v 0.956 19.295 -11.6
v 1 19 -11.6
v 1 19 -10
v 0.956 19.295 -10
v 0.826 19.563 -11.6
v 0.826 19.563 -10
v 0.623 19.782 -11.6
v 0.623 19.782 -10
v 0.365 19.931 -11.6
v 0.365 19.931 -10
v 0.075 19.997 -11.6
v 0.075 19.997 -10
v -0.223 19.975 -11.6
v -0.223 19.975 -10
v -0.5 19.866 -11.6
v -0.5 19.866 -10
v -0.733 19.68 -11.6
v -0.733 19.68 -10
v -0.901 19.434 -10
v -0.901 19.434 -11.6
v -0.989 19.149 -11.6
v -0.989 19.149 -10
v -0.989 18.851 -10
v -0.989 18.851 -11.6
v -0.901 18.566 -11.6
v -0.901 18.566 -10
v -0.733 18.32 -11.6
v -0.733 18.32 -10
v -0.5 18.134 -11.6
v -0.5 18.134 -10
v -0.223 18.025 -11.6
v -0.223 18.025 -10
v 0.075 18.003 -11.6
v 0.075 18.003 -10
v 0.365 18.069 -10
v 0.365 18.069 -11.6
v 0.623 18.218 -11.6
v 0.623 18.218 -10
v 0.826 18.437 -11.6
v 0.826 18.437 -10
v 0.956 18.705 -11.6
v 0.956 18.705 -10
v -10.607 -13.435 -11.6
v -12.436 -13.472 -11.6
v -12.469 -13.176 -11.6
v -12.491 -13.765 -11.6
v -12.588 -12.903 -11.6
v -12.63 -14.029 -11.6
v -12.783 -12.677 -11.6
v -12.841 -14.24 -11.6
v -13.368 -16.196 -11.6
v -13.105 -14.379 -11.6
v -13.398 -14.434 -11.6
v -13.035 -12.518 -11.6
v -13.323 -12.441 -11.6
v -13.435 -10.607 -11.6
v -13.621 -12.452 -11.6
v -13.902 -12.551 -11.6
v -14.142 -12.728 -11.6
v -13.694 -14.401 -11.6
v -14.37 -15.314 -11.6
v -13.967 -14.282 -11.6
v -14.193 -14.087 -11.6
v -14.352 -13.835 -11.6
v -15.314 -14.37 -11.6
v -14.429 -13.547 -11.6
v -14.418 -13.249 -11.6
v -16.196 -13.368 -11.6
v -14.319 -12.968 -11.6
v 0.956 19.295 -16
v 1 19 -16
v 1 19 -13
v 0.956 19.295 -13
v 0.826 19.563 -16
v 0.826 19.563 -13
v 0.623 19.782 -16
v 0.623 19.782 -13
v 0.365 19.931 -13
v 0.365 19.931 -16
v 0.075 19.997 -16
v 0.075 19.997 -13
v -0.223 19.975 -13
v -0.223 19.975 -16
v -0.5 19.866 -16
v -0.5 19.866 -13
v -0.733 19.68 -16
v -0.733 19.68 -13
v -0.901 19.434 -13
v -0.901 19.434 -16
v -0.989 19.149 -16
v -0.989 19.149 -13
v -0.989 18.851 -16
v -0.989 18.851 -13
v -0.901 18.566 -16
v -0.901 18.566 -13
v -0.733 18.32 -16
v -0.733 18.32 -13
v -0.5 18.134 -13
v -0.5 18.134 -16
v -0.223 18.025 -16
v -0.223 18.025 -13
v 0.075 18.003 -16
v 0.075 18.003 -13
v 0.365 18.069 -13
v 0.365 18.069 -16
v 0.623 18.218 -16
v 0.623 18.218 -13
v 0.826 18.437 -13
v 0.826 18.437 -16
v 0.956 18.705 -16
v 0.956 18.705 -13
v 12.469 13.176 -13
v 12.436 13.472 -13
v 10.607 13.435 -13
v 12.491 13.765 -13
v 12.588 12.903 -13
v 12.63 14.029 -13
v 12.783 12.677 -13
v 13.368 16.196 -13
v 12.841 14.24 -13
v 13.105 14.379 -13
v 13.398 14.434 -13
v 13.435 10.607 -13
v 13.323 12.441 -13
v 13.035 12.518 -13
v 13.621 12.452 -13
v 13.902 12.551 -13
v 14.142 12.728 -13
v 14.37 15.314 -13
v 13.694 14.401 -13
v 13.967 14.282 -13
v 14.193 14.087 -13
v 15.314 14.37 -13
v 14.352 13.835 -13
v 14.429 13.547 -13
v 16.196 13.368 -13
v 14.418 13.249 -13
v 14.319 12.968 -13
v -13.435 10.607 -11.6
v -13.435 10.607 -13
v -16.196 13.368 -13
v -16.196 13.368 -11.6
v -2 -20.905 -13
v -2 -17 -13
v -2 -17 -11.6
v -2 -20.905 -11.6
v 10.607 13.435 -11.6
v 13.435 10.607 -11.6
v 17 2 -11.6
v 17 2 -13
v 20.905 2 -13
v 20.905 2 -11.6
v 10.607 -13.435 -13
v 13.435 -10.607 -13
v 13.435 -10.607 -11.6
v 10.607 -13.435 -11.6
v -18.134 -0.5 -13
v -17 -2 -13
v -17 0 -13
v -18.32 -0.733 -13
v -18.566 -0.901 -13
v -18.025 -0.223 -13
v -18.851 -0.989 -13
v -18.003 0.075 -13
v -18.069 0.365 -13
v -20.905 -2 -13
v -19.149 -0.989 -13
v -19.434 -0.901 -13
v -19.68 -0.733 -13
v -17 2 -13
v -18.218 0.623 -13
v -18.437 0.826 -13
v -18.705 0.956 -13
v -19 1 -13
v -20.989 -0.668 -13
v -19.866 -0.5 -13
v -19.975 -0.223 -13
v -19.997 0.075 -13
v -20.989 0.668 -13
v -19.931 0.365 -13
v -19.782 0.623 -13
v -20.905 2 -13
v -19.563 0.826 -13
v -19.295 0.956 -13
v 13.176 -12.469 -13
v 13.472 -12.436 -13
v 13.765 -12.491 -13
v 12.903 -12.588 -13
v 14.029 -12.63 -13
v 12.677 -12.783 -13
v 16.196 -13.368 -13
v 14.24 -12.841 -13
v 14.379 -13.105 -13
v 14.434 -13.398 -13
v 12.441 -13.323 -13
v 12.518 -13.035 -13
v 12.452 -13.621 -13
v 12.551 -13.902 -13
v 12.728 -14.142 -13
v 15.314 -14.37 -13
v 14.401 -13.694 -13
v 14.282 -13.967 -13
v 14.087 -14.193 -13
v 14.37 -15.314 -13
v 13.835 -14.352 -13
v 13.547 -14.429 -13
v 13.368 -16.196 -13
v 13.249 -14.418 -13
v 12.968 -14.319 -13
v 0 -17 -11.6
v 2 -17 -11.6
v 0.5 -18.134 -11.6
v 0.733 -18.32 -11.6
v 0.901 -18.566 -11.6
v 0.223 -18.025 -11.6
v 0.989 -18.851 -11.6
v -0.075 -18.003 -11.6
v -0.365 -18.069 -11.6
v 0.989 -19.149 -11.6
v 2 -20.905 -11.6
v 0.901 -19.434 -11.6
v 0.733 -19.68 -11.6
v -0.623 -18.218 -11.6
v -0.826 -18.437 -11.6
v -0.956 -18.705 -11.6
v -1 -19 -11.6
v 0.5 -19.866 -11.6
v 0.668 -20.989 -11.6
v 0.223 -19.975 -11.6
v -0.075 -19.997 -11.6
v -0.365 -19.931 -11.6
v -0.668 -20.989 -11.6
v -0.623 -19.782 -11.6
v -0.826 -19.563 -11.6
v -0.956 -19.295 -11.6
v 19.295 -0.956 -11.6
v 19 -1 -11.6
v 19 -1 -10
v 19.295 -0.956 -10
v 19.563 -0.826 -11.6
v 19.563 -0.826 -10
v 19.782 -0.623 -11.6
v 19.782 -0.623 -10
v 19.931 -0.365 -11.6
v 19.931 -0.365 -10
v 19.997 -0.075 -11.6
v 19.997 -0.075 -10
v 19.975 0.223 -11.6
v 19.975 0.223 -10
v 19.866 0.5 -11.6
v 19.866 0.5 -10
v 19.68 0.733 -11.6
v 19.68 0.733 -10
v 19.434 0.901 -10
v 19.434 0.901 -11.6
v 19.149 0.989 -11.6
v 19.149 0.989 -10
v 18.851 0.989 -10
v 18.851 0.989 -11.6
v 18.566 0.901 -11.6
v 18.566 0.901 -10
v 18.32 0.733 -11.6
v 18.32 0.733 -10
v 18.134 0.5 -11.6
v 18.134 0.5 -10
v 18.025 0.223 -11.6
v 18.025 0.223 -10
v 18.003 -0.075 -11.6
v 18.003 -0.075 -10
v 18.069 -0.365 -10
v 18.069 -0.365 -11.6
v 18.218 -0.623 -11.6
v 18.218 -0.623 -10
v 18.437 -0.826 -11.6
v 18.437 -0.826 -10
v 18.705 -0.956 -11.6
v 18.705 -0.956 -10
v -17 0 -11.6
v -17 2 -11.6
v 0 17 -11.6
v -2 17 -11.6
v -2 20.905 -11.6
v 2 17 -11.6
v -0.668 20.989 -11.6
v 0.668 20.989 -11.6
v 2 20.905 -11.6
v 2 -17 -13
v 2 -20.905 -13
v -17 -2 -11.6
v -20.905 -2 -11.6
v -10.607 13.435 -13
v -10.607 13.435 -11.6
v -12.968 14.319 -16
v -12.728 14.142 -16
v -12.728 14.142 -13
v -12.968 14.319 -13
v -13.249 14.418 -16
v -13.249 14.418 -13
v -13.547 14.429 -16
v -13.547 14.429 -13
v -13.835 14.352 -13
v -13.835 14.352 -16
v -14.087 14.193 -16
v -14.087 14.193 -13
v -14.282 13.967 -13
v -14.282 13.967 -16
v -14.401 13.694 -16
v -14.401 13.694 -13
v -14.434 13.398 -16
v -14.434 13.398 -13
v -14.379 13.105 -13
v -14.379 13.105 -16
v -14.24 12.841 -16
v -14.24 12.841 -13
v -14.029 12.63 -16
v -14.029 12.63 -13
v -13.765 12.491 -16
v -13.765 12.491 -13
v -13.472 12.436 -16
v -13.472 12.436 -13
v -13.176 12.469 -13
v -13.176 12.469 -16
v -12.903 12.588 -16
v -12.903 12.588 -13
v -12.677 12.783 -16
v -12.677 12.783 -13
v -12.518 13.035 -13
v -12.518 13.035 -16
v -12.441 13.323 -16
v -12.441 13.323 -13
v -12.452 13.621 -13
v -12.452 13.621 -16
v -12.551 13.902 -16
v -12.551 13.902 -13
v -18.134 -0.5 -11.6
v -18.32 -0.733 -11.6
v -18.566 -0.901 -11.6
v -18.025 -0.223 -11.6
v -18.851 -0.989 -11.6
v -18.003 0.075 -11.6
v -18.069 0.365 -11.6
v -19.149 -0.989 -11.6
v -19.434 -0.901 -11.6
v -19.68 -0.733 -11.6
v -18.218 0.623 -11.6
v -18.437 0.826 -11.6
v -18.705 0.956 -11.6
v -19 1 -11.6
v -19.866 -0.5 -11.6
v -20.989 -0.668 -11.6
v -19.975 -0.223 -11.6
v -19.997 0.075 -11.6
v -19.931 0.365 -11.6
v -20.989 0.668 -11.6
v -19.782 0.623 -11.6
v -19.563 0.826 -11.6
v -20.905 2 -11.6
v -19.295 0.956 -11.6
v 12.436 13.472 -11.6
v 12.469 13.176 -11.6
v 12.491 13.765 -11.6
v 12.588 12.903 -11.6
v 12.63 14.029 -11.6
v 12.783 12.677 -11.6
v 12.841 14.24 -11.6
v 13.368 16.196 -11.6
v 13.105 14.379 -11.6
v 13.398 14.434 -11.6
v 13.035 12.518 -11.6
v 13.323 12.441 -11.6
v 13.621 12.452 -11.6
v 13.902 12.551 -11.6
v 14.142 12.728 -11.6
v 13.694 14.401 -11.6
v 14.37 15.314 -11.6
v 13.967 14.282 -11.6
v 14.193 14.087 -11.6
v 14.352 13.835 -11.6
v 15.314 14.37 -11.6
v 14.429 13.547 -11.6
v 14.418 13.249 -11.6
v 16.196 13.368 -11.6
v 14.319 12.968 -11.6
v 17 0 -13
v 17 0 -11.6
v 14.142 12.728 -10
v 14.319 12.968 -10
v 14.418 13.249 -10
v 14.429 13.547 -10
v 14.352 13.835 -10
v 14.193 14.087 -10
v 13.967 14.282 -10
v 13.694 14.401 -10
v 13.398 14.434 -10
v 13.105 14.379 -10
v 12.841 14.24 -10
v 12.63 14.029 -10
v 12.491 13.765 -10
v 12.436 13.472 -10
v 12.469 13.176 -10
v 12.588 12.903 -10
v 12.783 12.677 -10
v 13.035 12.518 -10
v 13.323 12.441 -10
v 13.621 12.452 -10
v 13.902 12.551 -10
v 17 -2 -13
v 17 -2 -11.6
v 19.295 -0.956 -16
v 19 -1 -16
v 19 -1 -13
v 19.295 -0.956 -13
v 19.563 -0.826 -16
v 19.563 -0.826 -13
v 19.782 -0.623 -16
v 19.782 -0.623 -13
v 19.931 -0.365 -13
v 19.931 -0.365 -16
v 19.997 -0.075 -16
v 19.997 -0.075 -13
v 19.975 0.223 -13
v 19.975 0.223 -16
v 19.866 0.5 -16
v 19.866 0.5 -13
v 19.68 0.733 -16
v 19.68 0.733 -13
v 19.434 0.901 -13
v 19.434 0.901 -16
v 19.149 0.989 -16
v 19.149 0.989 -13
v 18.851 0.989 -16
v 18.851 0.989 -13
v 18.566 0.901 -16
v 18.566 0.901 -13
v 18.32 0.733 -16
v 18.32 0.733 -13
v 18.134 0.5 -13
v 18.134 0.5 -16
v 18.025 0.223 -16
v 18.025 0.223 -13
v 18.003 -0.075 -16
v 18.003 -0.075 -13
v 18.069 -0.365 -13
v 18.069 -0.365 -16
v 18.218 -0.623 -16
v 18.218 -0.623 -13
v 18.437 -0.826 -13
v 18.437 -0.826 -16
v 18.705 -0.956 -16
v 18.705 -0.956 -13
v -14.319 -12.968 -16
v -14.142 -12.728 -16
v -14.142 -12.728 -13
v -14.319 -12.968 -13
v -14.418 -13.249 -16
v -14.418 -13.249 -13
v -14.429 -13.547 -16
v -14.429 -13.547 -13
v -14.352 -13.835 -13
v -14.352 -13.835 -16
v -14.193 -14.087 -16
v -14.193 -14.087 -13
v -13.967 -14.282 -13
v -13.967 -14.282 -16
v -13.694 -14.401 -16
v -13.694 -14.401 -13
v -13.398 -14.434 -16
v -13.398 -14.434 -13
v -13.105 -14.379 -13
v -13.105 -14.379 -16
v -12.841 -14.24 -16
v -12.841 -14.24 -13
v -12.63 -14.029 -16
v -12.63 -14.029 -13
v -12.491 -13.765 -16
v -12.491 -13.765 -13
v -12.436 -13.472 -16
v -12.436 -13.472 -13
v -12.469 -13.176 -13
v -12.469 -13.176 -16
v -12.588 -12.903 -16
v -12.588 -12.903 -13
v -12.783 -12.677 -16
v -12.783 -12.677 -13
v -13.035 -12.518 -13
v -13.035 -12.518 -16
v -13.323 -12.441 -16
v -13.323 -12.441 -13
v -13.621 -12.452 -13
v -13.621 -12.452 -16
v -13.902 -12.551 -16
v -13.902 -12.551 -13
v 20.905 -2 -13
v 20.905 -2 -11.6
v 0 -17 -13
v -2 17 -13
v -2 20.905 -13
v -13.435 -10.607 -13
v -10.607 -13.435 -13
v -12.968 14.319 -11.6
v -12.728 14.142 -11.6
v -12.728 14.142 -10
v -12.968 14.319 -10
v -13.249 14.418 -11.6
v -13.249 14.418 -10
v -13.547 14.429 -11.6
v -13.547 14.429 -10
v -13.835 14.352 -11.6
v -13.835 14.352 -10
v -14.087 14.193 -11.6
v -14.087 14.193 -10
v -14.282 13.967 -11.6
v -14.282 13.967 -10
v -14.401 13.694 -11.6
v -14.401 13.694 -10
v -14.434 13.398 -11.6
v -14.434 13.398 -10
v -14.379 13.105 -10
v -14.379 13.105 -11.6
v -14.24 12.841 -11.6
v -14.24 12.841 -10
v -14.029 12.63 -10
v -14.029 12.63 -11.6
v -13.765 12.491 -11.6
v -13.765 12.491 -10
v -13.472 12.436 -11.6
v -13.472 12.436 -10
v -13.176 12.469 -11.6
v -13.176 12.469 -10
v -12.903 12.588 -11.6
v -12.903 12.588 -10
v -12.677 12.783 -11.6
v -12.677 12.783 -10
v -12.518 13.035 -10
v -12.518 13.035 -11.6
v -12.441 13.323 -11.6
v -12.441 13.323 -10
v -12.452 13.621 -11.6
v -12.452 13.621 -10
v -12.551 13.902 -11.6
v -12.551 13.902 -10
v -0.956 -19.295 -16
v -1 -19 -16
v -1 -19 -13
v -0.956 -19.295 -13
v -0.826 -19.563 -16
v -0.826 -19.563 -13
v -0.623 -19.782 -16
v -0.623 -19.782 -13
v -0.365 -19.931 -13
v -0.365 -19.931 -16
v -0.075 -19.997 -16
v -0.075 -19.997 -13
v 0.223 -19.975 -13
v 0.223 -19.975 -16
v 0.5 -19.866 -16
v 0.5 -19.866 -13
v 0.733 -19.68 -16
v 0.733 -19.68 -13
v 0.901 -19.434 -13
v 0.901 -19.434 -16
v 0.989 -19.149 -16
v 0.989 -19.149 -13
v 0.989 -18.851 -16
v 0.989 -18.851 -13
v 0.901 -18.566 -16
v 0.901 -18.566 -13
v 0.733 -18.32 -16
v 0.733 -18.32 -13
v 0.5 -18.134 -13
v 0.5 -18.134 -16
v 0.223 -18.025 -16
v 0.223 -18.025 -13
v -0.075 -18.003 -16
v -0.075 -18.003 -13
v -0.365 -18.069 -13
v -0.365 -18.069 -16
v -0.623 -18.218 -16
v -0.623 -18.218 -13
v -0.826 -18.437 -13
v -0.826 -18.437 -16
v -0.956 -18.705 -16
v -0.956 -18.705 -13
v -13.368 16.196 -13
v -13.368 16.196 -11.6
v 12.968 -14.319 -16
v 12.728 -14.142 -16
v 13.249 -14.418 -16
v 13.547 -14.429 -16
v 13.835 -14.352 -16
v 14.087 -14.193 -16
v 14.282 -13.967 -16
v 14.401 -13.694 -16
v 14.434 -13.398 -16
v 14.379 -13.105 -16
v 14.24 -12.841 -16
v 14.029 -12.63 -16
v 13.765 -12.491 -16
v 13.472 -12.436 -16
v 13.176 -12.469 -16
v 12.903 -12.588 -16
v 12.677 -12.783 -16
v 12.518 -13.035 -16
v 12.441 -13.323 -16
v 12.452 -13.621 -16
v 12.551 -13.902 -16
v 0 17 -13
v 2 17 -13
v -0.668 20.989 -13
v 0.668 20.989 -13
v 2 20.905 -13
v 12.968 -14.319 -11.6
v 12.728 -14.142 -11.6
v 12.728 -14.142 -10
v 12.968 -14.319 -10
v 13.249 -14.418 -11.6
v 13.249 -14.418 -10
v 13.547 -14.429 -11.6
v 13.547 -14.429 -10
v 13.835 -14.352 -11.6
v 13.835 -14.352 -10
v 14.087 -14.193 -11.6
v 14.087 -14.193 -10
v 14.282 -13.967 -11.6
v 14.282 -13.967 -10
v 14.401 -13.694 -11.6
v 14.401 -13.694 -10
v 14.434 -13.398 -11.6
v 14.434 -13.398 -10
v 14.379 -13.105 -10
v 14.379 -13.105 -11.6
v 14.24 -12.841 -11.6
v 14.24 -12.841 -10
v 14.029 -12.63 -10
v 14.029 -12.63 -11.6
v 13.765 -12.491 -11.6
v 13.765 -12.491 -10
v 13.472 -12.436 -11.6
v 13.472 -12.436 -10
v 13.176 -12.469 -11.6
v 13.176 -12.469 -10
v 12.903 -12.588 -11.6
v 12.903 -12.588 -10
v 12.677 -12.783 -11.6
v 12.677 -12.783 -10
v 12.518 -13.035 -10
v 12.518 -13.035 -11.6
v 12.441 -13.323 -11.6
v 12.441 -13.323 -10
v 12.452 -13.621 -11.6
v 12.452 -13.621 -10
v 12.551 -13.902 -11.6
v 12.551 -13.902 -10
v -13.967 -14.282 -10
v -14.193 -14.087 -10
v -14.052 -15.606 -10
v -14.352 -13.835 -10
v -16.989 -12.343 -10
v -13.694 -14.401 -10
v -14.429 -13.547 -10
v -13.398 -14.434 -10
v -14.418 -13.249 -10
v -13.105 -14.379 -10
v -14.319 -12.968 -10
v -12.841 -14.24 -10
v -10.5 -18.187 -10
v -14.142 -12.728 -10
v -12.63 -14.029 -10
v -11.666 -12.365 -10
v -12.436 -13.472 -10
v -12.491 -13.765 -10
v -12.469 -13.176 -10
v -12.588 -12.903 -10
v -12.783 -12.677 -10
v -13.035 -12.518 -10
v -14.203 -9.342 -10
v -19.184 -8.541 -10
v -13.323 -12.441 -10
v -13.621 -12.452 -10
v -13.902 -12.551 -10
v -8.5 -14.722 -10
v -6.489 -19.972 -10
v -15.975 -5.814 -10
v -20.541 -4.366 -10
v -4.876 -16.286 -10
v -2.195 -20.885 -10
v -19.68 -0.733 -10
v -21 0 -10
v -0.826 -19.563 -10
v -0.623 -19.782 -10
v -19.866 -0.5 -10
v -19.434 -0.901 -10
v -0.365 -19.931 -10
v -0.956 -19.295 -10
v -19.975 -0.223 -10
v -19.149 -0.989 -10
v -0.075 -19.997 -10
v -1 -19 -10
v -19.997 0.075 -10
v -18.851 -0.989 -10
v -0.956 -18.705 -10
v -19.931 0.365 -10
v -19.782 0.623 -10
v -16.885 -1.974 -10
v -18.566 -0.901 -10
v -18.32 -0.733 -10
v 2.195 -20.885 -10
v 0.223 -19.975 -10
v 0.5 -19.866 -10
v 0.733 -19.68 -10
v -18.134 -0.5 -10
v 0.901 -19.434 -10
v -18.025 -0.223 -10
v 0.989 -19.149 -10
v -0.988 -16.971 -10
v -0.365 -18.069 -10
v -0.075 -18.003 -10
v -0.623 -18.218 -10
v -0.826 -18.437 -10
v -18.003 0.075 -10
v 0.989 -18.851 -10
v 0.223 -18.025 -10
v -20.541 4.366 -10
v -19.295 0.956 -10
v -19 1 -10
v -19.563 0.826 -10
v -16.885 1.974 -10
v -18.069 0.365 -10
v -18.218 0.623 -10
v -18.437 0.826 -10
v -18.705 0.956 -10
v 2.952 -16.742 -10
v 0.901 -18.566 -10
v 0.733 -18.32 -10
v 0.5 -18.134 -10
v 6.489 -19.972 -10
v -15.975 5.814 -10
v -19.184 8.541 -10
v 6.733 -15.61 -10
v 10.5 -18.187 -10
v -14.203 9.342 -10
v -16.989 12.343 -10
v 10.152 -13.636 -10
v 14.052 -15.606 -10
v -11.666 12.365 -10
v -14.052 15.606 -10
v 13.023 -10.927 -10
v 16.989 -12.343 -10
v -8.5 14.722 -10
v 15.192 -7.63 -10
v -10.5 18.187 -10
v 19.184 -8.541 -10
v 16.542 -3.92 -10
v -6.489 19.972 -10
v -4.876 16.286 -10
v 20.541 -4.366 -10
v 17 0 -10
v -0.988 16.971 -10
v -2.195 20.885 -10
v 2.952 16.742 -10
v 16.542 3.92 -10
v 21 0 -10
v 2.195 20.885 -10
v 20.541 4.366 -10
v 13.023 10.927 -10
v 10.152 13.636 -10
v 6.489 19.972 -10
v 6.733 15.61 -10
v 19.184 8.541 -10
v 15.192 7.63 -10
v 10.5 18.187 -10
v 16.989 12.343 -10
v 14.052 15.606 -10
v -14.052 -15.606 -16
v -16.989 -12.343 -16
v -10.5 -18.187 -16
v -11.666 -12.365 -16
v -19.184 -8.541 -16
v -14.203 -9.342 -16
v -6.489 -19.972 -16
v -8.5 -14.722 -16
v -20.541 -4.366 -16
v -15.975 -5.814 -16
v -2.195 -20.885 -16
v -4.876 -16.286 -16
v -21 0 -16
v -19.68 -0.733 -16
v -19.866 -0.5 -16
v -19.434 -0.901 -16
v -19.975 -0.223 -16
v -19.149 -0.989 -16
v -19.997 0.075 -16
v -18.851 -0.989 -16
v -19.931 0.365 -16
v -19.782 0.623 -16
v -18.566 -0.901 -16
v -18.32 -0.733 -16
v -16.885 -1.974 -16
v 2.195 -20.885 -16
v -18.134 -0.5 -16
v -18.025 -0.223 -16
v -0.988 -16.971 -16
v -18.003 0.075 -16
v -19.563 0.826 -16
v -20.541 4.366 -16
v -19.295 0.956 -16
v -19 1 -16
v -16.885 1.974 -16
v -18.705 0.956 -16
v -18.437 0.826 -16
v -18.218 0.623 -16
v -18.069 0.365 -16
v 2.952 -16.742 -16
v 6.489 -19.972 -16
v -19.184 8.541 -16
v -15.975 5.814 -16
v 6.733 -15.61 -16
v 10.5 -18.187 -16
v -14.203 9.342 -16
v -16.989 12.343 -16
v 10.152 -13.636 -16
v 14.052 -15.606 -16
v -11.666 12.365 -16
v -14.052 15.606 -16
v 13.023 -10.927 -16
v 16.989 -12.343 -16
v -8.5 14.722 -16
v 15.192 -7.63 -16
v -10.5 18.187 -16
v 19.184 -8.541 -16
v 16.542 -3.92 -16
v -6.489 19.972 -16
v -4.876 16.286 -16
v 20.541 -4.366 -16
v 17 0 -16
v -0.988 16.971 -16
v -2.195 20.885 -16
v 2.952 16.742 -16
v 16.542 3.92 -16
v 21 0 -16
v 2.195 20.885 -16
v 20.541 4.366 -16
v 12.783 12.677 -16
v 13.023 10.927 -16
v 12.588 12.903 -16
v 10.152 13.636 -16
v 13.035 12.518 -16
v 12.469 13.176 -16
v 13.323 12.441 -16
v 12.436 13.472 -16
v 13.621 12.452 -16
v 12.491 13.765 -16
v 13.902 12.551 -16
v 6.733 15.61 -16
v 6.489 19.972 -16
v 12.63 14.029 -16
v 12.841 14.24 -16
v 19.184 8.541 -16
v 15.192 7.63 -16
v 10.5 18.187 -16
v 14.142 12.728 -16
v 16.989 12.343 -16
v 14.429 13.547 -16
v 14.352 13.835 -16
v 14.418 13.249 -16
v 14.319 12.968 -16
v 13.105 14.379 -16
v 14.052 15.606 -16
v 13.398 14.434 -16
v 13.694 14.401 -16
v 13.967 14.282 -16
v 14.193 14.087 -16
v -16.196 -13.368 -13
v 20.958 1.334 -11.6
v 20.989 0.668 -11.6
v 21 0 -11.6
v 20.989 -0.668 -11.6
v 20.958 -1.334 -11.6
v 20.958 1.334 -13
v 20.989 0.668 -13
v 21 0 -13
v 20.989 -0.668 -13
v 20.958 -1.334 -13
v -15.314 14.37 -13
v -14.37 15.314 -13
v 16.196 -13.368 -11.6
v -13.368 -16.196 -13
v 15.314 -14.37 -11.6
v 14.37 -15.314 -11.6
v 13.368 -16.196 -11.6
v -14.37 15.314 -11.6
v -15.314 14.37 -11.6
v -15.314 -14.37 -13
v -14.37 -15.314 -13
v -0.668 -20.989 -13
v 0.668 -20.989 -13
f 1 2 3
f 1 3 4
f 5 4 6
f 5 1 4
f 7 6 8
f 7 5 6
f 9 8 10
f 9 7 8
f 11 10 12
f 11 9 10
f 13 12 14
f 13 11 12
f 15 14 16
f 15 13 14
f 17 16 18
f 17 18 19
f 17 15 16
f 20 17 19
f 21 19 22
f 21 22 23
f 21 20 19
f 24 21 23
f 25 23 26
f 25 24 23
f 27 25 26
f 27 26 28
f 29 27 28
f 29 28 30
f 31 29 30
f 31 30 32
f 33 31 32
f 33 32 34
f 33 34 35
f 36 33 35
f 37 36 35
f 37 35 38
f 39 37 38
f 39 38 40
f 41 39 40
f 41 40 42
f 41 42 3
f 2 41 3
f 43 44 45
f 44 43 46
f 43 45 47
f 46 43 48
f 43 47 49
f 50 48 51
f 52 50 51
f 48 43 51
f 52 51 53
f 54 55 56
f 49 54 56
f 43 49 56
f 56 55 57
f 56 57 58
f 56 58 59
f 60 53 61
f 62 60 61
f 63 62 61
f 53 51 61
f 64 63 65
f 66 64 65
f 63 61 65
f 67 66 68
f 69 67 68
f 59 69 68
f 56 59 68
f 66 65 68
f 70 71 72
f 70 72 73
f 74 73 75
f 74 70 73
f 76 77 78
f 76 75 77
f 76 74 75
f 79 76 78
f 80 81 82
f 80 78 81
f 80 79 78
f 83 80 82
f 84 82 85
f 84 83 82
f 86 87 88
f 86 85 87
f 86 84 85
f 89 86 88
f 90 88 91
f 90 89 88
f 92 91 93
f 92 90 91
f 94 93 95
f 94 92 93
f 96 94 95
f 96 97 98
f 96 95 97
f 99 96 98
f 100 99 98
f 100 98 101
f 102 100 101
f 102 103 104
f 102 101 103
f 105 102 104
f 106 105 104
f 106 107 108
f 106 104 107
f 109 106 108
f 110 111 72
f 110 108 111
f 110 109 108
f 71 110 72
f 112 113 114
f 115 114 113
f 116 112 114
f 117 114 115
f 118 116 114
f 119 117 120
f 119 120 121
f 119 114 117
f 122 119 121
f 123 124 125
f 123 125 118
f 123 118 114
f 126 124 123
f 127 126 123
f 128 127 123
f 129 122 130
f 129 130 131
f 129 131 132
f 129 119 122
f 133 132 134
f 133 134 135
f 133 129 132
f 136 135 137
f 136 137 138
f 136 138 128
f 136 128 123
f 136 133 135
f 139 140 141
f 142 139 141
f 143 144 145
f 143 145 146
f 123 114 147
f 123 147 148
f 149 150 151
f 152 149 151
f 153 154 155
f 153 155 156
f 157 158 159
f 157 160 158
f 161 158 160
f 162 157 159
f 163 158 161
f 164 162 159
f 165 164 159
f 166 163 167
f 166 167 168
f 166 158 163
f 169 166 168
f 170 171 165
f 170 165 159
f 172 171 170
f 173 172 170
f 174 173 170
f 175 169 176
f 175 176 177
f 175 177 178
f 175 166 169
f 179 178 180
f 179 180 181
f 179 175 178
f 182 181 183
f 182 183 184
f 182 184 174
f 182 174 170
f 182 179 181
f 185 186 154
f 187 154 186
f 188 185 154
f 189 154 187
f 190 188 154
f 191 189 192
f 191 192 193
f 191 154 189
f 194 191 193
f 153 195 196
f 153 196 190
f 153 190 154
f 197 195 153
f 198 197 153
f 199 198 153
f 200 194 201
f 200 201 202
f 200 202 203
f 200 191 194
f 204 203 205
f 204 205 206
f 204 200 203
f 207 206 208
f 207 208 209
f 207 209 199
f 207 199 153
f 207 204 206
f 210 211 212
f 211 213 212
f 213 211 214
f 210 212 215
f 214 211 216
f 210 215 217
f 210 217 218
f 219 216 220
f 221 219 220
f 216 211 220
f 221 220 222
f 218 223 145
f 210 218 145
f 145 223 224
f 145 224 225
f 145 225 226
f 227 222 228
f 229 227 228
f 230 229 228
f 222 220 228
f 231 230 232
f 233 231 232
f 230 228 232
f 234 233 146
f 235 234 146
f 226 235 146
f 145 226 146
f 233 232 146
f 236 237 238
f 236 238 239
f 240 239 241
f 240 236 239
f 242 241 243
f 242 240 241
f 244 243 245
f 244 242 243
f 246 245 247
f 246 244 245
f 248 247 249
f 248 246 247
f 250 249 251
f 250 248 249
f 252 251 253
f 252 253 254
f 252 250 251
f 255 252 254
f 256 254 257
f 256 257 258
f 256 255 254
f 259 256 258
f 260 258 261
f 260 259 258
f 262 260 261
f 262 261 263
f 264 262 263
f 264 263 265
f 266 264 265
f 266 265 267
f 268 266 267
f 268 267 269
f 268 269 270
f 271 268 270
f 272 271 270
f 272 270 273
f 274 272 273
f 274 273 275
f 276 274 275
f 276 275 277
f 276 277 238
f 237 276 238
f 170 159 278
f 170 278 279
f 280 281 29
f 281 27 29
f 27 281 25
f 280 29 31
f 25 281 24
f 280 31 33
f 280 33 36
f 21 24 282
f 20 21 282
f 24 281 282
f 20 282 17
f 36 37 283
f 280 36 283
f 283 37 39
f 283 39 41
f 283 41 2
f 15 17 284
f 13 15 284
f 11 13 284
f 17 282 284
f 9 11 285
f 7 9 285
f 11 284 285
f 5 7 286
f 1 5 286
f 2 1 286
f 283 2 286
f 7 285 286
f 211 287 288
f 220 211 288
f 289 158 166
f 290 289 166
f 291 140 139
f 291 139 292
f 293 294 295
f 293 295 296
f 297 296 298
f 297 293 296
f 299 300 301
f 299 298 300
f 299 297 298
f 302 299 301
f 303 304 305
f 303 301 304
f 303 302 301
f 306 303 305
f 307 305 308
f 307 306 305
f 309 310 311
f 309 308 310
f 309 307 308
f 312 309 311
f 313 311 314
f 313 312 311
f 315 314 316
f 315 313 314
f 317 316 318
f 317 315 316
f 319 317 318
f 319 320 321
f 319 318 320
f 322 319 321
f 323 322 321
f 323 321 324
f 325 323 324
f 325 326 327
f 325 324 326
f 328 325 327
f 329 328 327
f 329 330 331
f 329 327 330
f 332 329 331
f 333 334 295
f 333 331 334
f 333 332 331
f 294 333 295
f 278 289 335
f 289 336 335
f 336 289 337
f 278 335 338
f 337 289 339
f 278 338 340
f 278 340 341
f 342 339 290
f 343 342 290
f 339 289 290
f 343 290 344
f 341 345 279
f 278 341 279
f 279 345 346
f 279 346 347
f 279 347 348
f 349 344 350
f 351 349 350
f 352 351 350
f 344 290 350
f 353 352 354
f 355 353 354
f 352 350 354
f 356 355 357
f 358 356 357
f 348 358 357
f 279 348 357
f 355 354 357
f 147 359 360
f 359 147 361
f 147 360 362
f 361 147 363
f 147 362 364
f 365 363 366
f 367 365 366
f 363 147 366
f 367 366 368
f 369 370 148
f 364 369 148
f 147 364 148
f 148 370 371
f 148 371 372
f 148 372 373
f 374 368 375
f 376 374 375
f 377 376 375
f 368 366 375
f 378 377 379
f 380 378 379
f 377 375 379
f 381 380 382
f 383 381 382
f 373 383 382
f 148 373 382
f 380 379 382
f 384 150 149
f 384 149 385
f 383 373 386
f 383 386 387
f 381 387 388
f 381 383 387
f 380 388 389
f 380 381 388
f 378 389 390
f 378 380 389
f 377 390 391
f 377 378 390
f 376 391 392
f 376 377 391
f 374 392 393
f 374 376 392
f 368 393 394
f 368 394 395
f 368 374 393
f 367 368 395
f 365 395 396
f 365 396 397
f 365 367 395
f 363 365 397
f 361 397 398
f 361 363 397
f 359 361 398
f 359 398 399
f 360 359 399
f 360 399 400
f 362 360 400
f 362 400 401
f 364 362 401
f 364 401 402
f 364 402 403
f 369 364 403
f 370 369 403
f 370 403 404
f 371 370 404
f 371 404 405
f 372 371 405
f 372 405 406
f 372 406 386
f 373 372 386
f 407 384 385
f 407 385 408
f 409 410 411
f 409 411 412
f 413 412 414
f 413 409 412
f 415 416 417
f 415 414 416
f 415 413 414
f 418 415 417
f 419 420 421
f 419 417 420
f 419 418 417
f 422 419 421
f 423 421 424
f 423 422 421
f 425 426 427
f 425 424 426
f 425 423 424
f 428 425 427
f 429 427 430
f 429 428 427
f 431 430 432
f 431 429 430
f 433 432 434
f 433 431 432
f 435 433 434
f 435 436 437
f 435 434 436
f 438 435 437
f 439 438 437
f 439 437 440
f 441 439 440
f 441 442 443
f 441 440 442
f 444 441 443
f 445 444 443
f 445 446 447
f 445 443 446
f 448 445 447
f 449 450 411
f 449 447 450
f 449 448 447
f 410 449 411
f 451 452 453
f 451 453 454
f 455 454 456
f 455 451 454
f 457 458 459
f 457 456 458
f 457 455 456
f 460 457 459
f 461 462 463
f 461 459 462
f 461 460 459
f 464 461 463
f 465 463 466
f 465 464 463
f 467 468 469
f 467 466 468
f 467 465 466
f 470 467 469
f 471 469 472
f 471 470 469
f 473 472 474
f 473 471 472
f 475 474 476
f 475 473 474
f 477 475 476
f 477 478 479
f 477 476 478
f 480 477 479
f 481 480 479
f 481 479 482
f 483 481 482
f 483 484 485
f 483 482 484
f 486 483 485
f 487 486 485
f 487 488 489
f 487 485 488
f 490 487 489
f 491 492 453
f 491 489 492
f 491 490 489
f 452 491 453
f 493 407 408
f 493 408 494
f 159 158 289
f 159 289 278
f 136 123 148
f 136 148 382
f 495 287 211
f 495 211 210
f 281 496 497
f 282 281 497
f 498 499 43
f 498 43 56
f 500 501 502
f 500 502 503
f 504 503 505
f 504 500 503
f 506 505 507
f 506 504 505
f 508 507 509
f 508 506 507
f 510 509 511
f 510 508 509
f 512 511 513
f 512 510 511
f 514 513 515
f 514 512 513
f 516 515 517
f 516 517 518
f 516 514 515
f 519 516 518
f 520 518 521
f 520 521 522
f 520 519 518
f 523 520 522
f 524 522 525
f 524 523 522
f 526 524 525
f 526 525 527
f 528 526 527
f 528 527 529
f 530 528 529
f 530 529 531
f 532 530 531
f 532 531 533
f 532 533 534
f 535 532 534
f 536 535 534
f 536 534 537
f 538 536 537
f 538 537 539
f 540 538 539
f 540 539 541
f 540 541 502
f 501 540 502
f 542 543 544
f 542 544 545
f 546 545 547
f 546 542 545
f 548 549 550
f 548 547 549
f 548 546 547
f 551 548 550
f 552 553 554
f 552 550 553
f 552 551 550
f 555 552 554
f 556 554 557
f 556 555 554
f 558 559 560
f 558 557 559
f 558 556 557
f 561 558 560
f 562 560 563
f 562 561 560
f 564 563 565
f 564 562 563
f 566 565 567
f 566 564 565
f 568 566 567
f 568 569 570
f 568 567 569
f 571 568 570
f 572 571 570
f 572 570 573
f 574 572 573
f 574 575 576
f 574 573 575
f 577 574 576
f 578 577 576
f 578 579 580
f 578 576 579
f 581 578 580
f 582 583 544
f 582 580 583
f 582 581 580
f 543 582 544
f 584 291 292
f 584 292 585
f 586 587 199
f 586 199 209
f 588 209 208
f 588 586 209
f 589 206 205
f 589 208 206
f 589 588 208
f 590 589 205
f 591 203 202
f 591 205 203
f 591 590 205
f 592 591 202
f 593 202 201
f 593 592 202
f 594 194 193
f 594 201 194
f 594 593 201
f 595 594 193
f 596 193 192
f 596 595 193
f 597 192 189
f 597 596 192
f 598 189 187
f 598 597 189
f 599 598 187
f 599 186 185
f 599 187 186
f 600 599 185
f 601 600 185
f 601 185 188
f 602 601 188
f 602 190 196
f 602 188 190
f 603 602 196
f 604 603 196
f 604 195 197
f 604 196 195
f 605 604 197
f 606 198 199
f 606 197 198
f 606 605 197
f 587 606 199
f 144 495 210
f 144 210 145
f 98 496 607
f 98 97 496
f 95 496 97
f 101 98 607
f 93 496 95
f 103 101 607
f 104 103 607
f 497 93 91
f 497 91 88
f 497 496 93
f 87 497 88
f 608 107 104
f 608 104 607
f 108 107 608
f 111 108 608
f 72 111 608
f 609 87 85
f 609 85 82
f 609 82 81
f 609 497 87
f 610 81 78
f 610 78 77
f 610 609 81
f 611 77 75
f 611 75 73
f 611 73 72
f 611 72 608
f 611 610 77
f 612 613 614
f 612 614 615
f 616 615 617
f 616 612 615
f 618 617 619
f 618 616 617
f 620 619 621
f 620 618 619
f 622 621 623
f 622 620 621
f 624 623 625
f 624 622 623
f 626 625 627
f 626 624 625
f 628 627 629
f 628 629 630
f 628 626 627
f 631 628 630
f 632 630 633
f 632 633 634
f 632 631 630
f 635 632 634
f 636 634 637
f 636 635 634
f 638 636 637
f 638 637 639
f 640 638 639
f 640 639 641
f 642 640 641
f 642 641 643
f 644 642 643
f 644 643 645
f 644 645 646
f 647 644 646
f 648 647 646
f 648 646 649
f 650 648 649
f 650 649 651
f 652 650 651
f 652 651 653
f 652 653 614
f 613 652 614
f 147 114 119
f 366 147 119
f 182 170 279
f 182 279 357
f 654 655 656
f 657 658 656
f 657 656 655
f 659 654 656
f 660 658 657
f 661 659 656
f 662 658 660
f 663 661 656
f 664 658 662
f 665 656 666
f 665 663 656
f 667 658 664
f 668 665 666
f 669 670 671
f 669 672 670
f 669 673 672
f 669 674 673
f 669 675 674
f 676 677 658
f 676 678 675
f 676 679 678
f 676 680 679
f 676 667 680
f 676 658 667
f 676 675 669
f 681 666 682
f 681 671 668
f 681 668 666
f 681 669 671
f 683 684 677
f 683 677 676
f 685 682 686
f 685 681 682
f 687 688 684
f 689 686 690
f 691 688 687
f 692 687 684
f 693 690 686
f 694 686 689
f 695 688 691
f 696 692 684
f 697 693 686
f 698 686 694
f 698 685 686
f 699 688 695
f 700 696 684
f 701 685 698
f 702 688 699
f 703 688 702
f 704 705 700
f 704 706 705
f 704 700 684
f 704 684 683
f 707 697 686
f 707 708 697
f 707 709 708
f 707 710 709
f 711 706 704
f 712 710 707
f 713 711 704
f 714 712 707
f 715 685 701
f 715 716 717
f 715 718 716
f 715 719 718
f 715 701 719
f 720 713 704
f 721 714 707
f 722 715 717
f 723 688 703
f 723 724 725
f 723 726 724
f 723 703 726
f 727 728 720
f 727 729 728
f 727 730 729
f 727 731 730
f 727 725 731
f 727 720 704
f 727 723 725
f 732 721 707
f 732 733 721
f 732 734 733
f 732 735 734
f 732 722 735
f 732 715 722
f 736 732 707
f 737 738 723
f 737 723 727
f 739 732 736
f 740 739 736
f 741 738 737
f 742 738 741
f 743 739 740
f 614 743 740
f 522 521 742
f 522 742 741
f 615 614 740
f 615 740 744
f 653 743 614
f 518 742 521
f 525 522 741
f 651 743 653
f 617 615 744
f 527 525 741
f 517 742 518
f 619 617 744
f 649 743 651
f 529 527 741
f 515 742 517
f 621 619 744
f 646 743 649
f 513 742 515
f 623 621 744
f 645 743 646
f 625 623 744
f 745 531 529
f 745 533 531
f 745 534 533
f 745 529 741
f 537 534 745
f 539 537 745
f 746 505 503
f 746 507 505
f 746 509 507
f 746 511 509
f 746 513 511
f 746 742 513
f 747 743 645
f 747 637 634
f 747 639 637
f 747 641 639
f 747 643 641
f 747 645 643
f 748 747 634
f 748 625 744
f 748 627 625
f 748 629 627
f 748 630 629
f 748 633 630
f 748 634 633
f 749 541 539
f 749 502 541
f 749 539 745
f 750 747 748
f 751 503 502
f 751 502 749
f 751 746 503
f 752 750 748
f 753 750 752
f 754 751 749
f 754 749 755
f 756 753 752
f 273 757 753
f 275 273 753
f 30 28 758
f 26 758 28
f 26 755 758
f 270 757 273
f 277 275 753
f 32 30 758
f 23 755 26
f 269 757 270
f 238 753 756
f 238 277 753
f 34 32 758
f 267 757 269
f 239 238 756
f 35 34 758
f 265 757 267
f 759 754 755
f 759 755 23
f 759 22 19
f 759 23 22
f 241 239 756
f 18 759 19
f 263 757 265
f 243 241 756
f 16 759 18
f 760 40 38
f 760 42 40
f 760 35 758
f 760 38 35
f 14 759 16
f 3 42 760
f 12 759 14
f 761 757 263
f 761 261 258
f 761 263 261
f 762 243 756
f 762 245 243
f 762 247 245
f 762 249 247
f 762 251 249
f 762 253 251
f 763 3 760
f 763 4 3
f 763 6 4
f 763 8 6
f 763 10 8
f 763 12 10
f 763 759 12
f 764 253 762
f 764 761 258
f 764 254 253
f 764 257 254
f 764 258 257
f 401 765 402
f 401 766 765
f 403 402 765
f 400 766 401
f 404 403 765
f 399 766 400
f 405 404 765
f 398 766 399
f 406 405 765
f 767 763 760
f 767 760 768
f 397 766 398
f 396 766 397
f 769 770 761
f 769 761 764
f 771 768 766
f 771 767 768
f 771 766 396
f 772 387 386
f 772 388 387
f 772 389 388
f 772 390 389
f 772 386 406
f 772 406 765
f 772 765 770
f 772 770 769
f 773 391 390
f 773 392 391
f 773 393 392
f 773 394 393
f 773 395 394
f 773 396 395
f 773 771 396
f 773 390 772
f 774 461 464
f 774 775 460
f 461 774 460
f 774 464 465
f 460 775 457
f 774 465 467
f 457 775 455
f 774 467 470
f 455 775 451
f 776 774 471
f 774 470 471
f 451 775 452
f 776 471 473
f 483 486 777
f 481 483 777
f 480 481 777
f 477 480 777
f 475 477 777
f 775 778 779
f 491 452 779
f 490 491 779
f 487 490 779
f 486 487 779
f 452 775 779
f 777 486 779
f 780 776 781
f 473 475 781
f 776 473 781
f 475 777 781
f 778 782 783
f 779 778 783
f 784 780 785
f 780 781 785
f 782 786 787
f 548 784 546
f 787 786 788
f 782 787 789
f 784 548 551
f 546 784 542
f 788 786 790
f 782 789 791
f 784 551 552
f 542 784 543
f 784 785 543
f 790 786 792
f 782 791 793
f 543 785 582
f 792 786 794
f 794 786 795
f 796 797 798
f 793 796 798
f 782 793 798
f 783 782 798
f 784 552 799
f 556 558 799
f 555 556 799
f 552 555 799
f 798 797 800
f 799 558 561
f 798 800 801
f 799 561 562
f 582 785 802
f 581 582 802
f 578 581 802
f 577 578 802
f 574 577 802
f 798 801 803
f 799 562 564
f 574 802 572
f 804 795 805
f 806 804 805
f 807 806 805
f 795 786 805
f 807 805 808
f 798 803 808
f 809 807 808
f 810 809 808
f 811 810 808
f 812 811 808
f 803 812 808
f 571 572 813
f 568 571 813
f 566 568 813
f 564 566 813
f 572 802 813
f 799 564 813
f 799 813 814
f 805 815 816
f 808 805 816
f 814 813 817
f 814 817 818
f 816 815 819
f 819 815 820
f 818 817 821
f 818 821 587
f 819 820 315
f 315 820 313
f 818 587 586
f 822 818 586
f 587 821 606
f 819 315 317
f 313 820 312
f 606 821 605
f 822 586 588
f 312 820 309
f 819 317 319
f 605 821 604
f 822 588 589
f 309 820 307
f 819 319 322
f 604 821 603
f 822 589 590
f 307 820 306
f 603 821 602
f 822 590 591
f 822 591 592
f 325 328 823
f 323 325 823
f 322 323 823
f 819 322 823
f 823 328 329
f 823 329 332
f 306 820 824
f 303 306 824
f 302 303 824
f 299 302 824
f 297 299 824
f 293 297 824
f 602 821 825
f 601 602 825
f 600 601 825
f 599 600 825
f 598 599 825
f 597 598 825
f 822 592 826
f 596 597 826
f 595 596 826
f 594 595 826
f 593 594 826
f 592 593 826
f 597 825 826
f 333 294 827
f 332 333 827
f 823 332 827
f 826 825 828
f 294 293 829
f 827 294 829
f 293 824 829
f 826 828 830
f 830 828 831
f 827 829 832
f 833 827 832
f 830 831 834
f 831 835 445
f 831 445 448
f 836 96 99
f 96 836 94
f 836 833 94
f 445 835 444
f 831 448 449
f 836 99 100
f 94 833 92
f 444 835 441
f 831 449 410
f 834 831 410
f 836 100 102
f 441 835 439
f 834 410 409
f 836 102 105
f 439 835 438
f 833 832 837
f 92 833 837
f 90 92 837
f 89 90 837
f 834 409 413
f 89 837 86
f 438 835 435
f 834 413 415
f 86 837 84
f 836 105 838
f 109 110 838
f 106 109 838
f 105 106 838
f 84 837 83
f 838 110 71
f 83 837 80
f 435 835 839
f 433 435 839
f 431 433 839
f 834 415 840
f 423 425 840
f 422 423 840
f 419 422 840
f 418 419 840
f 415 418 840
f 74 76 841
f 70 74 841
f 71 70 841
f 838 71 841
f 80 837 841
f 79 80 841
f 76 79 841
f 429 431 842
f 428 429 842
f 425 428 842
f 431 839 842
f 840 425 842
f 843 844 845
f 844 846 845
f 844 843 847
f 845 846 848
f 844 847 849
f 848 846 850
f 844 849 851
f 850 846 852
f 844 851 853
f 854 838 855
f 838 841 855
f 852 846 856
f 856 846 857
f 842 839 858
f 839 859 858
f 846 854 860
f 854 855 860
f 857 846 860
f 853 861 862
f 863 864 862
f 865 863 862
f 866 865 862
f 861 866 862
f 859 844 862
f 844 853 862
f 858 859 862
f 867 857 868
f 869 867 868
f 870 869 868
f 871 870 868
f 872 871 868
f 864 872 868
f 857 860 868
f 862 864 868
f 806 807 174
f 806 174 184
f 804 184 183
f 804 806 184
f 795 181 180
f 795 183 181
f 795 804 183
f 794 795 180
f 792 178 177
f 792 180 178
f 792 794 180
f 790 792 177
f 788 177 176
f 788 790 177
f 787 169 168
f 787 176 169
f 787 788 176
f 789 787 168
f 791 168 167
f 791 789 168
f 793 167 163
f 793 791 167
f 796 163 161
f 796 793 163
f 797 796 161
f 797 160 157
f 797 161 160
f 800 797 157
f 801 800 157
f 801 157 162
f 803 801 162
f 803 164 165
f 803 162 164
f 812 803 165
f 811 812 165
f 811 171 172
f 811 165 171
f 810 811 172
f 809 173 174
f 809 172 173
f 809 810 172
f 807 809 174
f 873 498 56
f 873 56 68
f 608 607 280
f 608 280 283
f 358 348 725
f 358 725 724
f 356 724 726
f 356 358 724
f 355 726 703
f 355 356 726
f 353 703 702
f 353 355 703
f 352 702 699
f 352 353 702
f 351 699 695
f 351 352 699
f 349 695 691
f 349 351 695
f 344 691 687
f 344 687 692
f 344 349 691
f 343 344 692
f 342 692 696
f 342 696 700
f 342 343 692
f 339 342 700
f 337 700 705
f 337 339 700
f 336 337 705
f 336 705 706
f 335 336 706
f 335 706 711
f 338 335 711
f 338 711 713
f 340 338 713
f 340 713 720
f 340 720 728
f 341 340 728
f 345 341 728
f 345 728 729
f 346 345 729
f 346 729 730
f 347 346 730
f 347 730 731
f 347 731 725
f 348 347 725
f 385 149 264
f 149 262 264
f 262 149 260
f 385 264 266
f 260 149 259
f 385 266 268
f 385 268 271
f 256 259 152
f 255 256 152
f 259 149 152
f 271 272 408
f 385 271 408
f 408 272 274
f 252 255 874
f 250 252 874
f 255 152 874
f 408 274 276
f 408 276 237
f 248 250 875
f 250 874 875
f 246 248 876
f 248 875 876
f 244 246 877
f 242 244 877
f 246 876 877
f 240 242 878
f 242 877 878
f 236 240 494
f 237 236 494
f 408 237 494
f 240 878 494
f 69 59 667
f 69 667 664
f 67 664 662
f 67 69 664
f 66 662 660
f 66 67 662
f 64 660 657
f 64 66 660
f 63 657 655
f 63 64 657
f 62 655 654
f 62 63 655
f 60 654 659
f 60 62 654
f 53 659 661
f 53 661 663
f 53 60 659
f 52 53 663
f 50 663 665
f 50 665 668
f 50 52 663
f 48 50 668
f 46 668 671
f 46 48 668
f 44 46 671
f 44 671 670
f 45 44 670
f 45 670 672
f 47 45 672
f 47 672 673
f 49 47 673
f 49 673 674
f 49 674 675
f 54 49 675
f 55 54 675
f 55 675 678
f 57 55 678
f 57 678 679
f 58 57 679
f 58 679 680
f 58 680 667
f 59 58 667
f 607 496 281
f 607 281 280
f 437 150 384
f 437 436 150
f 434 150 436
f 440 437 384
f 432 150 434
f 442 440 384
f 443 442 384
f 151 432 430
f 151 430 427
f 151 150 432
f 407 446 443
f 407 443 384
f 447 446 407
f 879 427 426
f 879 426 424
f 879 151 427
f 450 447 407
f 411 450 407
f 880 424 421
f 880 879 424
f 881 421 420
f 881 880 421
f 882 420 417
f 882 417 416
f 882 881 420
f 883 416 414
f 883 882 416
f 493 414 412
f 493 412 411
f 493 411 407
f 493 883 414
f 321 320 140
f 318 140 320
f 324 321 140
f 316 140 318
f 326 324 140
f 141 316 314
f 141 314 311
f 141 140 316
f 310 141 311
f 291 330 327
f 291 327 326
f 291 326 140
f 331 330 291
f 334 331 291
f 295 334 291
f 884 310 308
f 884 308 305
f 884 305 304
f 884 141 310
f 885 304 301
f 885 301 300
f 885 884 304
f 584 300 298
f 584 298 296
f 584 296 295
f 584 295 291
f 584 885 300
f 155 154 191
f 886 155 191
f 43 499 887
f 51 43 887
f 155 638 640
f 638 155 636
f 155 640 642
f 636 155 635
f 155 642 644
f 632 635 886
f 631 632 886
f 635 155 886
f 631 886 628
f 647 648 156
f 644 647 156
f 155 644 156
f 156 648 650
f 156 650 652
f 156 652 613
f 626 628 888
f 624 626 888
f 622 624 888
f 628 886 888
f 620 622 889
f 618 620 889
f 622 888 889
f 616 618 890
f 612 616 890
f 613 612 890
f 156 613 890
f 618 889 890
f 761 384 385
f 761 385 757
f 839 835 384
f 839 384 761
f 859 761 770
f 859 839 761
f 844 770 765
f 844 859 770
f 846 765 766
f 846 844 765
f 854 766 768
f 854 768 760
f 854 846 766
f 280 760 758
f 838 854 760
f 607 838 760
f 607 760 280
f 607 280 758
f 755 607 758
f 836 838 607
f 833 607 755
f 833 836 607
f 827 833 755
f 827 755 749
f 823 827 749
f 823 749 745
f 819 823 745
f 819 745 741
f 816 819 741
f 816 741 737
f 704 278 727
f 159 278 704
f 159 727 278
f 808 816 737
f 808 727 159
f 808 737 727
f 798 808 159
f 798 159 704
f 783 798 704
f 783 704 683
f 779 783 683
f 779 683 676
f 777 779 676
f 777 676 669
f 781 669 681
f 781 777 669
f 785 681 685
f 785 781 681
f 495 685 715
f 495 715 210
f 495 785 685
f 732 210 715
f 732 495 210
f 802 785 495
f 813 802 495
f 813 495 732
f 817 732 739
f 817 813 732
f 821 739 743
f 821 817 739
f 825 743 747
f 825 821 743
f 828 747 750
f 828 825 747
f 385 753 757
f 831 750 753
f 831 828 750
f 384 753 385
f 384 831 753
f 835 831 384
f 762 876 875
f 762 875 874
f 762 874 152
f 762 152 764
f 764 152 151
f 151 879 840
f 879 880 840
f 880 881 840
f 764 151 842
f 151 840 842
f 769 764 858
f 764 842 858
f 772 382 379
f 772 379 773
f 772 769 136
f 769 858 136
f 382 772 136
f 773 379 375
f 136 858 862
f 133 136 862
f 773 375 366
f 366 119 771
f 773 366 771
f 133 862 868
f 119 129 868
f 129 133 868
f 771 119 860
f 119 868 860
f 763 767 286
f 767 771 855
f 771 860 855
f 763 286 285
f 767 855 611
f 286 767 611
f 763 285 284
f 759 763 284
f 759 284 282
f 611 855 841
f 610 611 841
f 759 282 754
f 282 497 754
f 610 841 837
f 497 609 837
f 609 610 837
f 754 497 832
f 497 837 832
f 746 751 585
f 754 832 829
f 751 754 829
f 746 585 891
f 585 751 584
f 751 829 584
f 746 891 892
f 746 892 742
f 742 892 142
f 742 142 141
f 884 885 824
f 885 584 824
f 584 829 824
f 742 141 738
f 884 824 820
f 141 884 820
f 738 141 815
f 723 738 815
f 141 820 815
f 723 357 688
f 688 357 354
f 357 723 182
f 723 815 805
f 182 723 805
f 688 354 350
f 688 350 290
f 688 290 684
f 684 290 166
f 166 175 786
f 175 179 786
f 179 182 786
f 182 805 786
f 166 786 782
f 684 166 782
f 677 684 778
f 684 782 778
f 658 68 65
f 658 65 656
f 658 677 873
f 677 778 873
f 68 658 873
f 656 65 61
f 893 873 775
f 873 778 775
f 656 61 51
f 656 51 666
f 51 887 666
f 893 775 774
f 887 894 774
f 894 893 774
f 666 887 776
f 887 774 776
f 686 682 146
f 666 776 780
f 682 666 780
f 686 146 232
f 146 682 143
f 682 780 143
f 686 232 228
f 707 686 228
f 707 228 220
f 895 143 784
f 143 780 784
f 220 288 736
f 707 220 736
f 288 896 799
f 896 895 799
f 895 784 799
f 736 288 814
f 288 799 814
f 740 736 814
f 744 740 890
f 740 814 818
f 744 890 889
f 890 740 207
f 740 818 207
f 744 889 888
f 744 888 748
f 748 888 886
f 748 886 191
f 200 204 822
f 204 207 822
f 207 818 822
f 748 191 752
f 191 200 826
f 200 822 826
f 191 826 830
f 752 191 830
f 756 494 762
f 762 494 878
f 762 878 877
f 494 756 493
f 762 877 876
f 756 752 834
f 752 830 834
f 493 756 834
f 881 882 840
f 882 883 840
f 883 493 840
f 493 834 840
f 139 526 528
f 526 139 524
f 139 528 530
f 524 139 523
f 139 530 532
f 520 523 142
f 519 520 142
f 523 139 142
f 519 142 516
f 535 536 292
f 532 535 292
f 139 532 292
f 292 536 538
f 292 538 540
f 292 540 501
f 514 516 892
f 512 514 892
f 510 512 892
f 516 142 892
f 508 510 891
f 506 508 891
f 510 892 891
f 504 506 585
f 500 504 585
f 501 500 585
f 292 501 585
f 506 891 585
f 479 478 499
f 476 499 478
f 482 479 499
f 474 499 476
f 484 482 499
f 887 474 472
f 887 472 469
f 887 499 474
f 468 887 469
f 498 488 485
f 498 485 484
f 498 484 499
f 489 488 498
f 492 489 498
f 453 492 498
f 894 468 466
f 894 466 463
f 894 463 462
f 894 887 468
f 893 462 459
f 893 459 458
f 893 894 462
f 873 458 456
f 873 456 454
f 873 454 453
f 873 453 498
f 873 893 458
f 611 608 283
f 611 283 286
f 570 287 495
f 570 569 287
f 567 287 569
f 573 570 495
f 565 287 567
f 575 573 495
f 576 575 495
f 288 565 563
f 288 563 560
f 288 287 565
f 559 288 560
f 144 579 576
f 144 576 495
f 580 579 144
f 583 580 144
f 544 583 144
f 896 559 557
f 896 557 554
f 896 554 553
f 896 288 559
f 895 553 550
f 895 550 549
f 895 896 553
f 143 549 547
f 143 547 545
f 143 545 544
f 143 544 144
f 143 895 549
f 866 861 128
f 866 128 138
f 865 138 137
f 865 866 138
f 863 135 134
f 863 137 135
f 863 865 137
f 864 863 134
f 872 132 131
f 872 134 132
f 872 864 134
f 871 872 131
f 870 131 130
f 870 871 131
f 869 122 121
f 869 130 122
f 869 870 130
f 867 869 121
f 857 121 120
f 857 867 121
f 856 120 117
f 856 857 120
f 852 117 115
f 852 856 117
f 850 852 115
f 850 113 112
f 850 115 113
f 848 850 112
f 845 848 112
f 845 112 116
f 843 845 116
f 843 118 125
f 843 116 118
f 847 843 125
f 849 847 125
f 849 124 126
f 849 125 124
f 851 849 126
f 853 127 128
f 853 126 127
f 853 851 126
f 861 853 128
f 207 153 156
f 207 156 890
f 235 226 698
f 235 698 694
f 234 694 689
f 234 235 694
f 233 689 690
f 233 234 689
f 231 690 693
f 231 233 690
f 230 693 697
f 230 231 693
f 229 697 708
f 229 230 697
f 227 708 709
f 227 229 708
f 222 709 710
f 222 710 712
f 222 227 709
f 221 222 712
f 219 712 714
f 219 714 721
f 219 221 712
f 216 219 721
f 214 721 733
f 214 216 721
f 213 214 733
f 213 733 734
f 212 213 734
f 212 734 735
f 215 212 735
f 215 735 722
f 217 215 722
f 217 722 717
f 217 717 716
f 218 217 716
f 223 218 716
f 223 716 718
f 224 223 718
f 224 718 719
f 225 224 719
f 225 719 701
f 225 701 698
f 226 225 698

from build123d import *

# Parameters (mm, degrees)
CYLINDER2767_R               = 1
CYLINDER2767_DEPTH           = 10
CYLINDER2767_PLACEMENT_ANGLE = 45
CYLINDER2768_R               = 1
CYLINDER2768_DEPTH           = 10
CYLINDER2769_R               = 1
CYLINDER2769_DEPTH           = 10
CYLINDER2769_PLACEMENT_ANGLE = 135
CYLINDER2770_R               = 1
CYLINDER2770_DEPTH           = 10
CYLINDER2771_R               = 1
CYLINDER2771_DEPTH           = 10
CYLINDER2771_PLACEMENT_ANGLE = 225
CYLINDER2772_R               = 1
CYLINDER2772_DEPTH           = 10
CYLINDER2773_R               = 1
CYLINDER2773_DEPTH           = 10
CYLINDER2773_PLACEMENT_ANGLE = 45
CYLINDER2766_R               = 1
CYLINDER2766_DEPTH           = 10
BOX961_W                     = 4
BOX961_H                     = 4
BOX961_DEPTH                 = 1.4
BOX961_PLACEMENT_ANGLE       = 45
BOX964_W                     = 4
BOX964_H                     = 4
BOX964_DEPTH                 = 1.4
BOX962_W                     = 4
BOX962_H                     = 4
BOX962_DEPTH                 = 1.4
BOX962_PLACEMENT_ANGLE       = 135
BOX963_W                     = 4
BOX963_H                     = 4
BOX963_DEPTH                 = 1.4
BOX965_W                     = 4
BOX965_H                     = 4
BOX965_DEPTH                 = 1.4
BOX965_PLACEMENT_ANGLE       = 225
BOX967_W                     = 4
BOX967_H                     = 4
BOX967_DEPTH                 = 1.4
BOX966_W                     = 4
BOX966_H                     = 4
BOX966_DEPTH                 = 1.4
BOX966_PLACEMENT_ANGLE       = 45
BOX960_W                     = 4
BOX960_H                     = 4
BOX960_DEPTH                 = 1.4
TUBE135_R                    = 21
TUBE135_R_2                  = 17
TUBE135_DEPTH                = 6


with BuildPart() as v_lec2737:
    # Cylinder2767 → Cylinder2767 (new body)
    with BuildSketch(Plane.XY):
        Circle(CYLINDER2767_R)
    extrude(amount=CYLINDER2767_DEPTH)


with BuildPart() as v_lec2737_1:
    # Cylinder2767 placement: moved
    add(v_lec2737.part.moved(Location((-13.435029, 13.435029, -20))).rotate(Axis((-13.435029, 13.435029, -20), (0, 0, 1)), CYLINDER2767_PLACEMENT_ANGLE))


with BuildPart() as v_lec2738:
    # Cylinder2768 → Cylinder2768 (new body)
    with BuildSketch(Plane(origin=(-19, 0, -20), x_dir=(0, 1, 0), z_dir=(0, 0, 1))):
        Circle(CYLINDER2768_R)
    extrude(amount=CYLINDER2768_DEPTH)


with BuildPart() as v_lec2739:
    # Cylinder2769 → Cylinder2769 (new body)
    with BuildSketch(Plane.XY):
        Circle(CYLINDER2769_R)
    extrude(amount=CYLINDER2769_DEPTH)


with BuildPart() as v_lec2739_1:
    # Cylinder2769 placement: moved
    add(v_lec2739.part.moved(Location((-13.435029, -13.435029, -20))).rotate(Axis((-13.435029, -13.435029, -20), (0, 0, 1)), CYLINDER2769_PLACEMENT_ANGLE))


with BuildPart() as v_lec2740:
    # Cylinder2770 → Cylinder2770 (new body)
    with BuildSketch(Plane(origin=(0, -19, -20), x_dir=(-1, 0, 0), z_dir=(0, 0, 1))):
        Circle(CYLINDER2770_R)
    extrude(amount=CYLINDER2770_DEPTH)


with BuildPart() as v_lec2741:
    # Cylinder2771 → Cylinder2771 (new body)
    with BuildSketch(Plane.XY):
        Circle(CYLINDER2771_R)
    extrude(amount=CYLINDER2771_DEPTH)


with BuildPart() as v_lec2741_1:
    # Cylinder2771 placement: moved
    add(v_lec2741.part.moved(Location((13.435029, -13.435029, -20))).rotate(Axis((13.435029, -13.435029, -20), (0, 0, 1)), CYLINDER2771_PLACEMENT_ANGLE))


with BuildPart() as v_lec2742:
    # Cylinder2772 → Cylinder2772 (new body)
    with BuildSketch(Plane(origin=(19, 0, -20), x_dir=(0, -1, 0), z_dir=(0, 0, 1))):
        Circle(CYLINDER2772_R)
    extrude(amount=CYLINDER2772_DEPTH)


with BuildPart() as v_lec2743:
    # Cylinder2773 → Cylinder2773 (new body)
    with BuildSketch(Plane.XY):
        Circle(CYLINDER2773_R)
    extrude(amount=CYLINDER2773_DEPTH)


with BuildPart() as v_lec2743_1:
    # Cylinder2773 placement: moved
    add(v_lec2743.part.moved(Location((13.435029, 13.435029, -20))).rotate(Axis((13.435029, 13.435029, -20), (0, 0, -1)), CYLINDER2773_PLACEMENT_ANGLE))


with BuildPart() as compound1237:
    # Cylinder2766 → Cylinder2766 (new body)
    with BuildSketch(Plane(origin=(0, 19, -20), x_dir=(1, 0, 0), z_dir=(0, 0, 1))):
        Circle(CYLINDER2766_R)
    extrude(amount=CYLINDER2766_DEPTH)

    # Compound1237: union Válec2737, Válec2738, Válec2739, Válec2740, Válec2741, Válec2742, Válec2743
    add(v_lec2737_1.part)
    add(v_lec2738.part)
    add(v_lec2739_1.part)
    add(v_lec2740.part)
    add(v_lec2741_1.part)
    add(v_lec2742.part)
    add(v_lec2743_1.part)


with BuildPart() as krychle960:
    # Box961 → Box961 (new body)
    with BuildSketch(Plane.XY):
        with Locations((2, 2)):
            Rectangle(BOX961_W, BOX961_H)
    extrude(amount=BOX961_DEPTH)


with BuildPart() as krychle960_1:
    # Box961 placement: moved
    add(krychle960.part.moved(Location((-13.435029, 10.606602, -13))).rotate(Axis((-13.435029, 10.606602, -13), (0, 0, 1)), BOX961_PLACEMENT_ANGLE))


with BuildPart() as krychle963:
    # Box964 → Box964 (new body)
    with BuildSketch(Plane(origin=(-17, -2, -13), x_dir=(0, 1, 0), z_dir=(0, 0, 1))):
        with Locations((2, 2)):
            Rectangle(BOX964_W, BOX964_H)
    extrude(amount=BOX964_DEPTH)


with BuildPart() as krychle961:
    # Box962 → Box962 (new body)
    with BuildSketch(Plane.XY):
        with Locations((2, 2)):
            Rectangle(BOX962_W, BOX962_H)
    extrude(amount=BOX962_DEPTH)


with BuildPart() as krychle961_1:
    # Box962 placement: moved
    add(krychle961.part.moved(Location((-10.606602, -13.435029, -13))).rotate(Axis((-10.606602, -13.435029, -13), (0, 0, 1)), BOX962_PLACEMENT_ANGLE))


with BuildPart() as krychle962:
    # Box963 → Box963 (new body)
    with BuildSketch(Plane(origin=(2, -17, -13), x_dir=(-1, 0, 0), z_dir=(0, 0, 1))):
        with Locations((2, 2)):
            Rectangle(BOX963_W, BOX963_H)
    extrude(amount=BOX963_DEPTH)


with BuildPart() as krychle964:
    # Box965 → Box965 (new body)
    with BuildSketch(Plane.XY):
        with Locations((2, 2)):
            Rectangle(BOX965_W, BOX965_H)
    extrude(amount=BOX965_DEPTH)


with BuildPart() as krychle964_1:
    # Box965 placement: moved
    add(krychle964.part.moved(Location((13.435029, -10.606602, -13))).rotate(Axis((13.435029, -10.606602, -13), (0, 0, 1)), BOX965_PLACEMENT_ANGLE))


with BuildPart() as krychle966:
    # Box967 → Box967 (new body)
    with BuildSketch(Plane(origin=(17, 2, -13), x_dir=(0, -1, 0), z_dir=(0, 0, 1))):
        with Locations((2, 2)):
            Rectangle(BOX967_W, BOX967_H)
    extrude(amount=BOX967_DEPTH)


with BuildPart() as krychle965:
    # Box966 → Box966 (new body)
    with BuildSketch(Plane.XY):
        with Locations((2, 2)):
            Rectangle(BOX966_W, BOX966_H)
    extrude(amount=BOX966_DEPTH)


with BuildPart() as krychle965_1:
    # Box966 placement: moved
    add(krychle965.part.moved(Location((10.606602, 13.435029, -13))).rotate(Axis((10.606602, 13.435029, -13), (0, 0, -1)), BOX966_PLACEMENT_ANGLE))


with BuildPart() as compound1236:
    # Box960 → Box960 (new body)
    with BuildSketch(Plane(origin=(-2, 17, -13), x_dir=(1, 0, 0), z_dir=(0, 0, 1))):
        with Locations((2, 2)):
            Rectangle(BOX960_W, BOX960_H)
    extrude(amount=BOX960_DEPTH)

    # Compound1236: union Krychle960, Krychle963, Krychle961, Krychle962, Krychle964, Krychle966, Krychle965
    add(krychle960_1.part)
    add(krychle963.part)
    add(krychle961_1.part)
    add(krychle962.part)
    add(krychle964_1.part)
    add(krychle966.part)
    add(krychle965_1.part)


with BuildPart() as cut1045:
    # Tube135 → Tube135 (new body)
    with BuildSketch(Plane.XY.offset(-16)):
        Circle(TUBE135_R)
        Circle(TUBE135_R_2, mode=Mode.SUBTRACT)
    extrude(amount=TUBE135_DEPTH)

    # Cut1044: cut Compound1236
    add(compound1236.part, mode=Mode.SUBTRACT)

    # Cut1045: cut Compound1237
    add(compound1237.part, mode=Mode.SUBTRACT)


solid = cut1045.part
